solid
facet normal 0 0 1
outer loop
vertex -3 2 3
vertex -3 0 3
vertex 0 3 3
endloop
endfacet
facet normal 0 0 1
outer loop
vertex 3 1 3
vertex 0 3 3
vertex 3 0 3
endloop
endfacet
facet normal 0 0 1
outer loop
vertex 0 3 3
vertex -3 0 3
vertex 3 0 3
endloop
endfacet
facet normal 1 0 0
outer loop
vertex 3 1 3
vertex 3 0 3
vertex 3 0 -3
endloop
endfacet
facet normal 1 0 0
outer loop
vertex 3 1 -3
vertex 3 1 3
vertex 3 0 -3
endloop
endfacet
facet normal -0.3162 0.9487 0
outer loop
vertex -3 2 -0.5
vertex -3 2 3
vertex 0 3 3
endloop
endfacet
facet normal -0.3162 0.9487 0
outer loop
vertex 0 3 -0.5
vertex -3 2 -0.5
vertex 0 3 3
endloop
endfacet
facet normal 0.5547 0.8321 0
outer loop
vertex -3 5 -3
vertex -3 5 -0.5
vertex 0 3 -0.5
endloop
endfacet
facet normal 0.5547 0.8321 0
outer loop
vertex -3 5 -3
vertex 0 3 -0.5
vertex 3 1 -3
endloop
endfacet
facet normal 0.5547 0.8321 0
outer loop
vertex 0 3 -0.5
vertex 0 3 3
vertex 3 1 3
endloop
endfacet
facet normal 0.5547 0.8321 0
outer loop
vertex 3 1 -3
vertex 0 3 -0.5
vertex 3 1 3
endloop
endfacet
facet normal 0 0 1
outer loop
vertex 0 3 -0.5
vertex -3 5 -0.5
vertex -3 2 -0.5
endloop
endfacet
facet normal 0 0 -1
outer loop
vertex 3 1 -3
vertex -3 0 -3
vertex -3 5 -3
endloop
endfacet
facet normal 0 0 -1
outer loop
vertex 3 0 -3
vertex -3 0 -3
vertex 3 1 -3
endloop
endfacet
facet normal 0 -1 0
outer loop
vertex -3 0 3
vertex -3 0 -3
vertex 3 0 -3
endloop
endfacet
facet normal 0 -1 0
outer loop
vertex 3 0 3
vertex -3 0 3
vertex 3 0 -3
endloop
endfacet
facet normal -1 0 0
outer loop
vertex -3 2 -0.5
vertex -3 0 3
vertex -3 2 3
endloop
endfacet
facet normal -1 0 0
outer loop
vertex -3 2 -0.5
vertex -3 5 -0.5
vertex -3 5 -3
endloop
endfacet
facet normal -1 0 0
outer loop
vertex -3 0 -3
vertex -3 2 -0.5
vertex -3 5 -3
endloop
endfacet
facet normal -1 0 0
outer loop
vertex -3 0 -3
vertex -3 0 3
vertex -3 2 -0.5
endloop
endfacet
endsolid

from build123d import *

# Parameters (mm, degrees)
SKETCH1_W           = 6
SKETCH1_H           = 6
BOSS_EXTRUDE1_DEPTH = 5
CUT_EXTRUDE7_DEPTH  = 8
CUT_EXTRUDE8_DEPTH  = 3.5


with BuildPart() as part:
    # Sketch1 → Boss-Extrude1 (new body)
    with BuildSketch(Plane(origin=(0, 0, 0), x_dir=(1, 0, 0), z_dir=(0, 1, 0))):
        Rectangle(SKETCH1_W, SKETCH1_H)
    extrude(amount=BOSS_EXTRUDE1_DEPTH)

    # Sketch10 → Cut-Extrude7 (cut)
    with BuildSketch(Plane.XY.offset(3)):
        Polygon((3, 5), (-3, 5), (3, 1), align=None)
    extrude(amount=-CUT_EXTRUDE7_DEPTH, mode=Mode.SUBTRACT)

    # Sketch11 → Cut-Extrude8 (cut)
    with BuildSketch(Plane.XY.offset(3)):
        Polygon((-3, 5), (-3, 2), (0, 3), align=None)
    extrude(amount=-CUT_EXTRUDE8_DEPTH, mode=Mode.SUBTRACT)


solid = part.part
